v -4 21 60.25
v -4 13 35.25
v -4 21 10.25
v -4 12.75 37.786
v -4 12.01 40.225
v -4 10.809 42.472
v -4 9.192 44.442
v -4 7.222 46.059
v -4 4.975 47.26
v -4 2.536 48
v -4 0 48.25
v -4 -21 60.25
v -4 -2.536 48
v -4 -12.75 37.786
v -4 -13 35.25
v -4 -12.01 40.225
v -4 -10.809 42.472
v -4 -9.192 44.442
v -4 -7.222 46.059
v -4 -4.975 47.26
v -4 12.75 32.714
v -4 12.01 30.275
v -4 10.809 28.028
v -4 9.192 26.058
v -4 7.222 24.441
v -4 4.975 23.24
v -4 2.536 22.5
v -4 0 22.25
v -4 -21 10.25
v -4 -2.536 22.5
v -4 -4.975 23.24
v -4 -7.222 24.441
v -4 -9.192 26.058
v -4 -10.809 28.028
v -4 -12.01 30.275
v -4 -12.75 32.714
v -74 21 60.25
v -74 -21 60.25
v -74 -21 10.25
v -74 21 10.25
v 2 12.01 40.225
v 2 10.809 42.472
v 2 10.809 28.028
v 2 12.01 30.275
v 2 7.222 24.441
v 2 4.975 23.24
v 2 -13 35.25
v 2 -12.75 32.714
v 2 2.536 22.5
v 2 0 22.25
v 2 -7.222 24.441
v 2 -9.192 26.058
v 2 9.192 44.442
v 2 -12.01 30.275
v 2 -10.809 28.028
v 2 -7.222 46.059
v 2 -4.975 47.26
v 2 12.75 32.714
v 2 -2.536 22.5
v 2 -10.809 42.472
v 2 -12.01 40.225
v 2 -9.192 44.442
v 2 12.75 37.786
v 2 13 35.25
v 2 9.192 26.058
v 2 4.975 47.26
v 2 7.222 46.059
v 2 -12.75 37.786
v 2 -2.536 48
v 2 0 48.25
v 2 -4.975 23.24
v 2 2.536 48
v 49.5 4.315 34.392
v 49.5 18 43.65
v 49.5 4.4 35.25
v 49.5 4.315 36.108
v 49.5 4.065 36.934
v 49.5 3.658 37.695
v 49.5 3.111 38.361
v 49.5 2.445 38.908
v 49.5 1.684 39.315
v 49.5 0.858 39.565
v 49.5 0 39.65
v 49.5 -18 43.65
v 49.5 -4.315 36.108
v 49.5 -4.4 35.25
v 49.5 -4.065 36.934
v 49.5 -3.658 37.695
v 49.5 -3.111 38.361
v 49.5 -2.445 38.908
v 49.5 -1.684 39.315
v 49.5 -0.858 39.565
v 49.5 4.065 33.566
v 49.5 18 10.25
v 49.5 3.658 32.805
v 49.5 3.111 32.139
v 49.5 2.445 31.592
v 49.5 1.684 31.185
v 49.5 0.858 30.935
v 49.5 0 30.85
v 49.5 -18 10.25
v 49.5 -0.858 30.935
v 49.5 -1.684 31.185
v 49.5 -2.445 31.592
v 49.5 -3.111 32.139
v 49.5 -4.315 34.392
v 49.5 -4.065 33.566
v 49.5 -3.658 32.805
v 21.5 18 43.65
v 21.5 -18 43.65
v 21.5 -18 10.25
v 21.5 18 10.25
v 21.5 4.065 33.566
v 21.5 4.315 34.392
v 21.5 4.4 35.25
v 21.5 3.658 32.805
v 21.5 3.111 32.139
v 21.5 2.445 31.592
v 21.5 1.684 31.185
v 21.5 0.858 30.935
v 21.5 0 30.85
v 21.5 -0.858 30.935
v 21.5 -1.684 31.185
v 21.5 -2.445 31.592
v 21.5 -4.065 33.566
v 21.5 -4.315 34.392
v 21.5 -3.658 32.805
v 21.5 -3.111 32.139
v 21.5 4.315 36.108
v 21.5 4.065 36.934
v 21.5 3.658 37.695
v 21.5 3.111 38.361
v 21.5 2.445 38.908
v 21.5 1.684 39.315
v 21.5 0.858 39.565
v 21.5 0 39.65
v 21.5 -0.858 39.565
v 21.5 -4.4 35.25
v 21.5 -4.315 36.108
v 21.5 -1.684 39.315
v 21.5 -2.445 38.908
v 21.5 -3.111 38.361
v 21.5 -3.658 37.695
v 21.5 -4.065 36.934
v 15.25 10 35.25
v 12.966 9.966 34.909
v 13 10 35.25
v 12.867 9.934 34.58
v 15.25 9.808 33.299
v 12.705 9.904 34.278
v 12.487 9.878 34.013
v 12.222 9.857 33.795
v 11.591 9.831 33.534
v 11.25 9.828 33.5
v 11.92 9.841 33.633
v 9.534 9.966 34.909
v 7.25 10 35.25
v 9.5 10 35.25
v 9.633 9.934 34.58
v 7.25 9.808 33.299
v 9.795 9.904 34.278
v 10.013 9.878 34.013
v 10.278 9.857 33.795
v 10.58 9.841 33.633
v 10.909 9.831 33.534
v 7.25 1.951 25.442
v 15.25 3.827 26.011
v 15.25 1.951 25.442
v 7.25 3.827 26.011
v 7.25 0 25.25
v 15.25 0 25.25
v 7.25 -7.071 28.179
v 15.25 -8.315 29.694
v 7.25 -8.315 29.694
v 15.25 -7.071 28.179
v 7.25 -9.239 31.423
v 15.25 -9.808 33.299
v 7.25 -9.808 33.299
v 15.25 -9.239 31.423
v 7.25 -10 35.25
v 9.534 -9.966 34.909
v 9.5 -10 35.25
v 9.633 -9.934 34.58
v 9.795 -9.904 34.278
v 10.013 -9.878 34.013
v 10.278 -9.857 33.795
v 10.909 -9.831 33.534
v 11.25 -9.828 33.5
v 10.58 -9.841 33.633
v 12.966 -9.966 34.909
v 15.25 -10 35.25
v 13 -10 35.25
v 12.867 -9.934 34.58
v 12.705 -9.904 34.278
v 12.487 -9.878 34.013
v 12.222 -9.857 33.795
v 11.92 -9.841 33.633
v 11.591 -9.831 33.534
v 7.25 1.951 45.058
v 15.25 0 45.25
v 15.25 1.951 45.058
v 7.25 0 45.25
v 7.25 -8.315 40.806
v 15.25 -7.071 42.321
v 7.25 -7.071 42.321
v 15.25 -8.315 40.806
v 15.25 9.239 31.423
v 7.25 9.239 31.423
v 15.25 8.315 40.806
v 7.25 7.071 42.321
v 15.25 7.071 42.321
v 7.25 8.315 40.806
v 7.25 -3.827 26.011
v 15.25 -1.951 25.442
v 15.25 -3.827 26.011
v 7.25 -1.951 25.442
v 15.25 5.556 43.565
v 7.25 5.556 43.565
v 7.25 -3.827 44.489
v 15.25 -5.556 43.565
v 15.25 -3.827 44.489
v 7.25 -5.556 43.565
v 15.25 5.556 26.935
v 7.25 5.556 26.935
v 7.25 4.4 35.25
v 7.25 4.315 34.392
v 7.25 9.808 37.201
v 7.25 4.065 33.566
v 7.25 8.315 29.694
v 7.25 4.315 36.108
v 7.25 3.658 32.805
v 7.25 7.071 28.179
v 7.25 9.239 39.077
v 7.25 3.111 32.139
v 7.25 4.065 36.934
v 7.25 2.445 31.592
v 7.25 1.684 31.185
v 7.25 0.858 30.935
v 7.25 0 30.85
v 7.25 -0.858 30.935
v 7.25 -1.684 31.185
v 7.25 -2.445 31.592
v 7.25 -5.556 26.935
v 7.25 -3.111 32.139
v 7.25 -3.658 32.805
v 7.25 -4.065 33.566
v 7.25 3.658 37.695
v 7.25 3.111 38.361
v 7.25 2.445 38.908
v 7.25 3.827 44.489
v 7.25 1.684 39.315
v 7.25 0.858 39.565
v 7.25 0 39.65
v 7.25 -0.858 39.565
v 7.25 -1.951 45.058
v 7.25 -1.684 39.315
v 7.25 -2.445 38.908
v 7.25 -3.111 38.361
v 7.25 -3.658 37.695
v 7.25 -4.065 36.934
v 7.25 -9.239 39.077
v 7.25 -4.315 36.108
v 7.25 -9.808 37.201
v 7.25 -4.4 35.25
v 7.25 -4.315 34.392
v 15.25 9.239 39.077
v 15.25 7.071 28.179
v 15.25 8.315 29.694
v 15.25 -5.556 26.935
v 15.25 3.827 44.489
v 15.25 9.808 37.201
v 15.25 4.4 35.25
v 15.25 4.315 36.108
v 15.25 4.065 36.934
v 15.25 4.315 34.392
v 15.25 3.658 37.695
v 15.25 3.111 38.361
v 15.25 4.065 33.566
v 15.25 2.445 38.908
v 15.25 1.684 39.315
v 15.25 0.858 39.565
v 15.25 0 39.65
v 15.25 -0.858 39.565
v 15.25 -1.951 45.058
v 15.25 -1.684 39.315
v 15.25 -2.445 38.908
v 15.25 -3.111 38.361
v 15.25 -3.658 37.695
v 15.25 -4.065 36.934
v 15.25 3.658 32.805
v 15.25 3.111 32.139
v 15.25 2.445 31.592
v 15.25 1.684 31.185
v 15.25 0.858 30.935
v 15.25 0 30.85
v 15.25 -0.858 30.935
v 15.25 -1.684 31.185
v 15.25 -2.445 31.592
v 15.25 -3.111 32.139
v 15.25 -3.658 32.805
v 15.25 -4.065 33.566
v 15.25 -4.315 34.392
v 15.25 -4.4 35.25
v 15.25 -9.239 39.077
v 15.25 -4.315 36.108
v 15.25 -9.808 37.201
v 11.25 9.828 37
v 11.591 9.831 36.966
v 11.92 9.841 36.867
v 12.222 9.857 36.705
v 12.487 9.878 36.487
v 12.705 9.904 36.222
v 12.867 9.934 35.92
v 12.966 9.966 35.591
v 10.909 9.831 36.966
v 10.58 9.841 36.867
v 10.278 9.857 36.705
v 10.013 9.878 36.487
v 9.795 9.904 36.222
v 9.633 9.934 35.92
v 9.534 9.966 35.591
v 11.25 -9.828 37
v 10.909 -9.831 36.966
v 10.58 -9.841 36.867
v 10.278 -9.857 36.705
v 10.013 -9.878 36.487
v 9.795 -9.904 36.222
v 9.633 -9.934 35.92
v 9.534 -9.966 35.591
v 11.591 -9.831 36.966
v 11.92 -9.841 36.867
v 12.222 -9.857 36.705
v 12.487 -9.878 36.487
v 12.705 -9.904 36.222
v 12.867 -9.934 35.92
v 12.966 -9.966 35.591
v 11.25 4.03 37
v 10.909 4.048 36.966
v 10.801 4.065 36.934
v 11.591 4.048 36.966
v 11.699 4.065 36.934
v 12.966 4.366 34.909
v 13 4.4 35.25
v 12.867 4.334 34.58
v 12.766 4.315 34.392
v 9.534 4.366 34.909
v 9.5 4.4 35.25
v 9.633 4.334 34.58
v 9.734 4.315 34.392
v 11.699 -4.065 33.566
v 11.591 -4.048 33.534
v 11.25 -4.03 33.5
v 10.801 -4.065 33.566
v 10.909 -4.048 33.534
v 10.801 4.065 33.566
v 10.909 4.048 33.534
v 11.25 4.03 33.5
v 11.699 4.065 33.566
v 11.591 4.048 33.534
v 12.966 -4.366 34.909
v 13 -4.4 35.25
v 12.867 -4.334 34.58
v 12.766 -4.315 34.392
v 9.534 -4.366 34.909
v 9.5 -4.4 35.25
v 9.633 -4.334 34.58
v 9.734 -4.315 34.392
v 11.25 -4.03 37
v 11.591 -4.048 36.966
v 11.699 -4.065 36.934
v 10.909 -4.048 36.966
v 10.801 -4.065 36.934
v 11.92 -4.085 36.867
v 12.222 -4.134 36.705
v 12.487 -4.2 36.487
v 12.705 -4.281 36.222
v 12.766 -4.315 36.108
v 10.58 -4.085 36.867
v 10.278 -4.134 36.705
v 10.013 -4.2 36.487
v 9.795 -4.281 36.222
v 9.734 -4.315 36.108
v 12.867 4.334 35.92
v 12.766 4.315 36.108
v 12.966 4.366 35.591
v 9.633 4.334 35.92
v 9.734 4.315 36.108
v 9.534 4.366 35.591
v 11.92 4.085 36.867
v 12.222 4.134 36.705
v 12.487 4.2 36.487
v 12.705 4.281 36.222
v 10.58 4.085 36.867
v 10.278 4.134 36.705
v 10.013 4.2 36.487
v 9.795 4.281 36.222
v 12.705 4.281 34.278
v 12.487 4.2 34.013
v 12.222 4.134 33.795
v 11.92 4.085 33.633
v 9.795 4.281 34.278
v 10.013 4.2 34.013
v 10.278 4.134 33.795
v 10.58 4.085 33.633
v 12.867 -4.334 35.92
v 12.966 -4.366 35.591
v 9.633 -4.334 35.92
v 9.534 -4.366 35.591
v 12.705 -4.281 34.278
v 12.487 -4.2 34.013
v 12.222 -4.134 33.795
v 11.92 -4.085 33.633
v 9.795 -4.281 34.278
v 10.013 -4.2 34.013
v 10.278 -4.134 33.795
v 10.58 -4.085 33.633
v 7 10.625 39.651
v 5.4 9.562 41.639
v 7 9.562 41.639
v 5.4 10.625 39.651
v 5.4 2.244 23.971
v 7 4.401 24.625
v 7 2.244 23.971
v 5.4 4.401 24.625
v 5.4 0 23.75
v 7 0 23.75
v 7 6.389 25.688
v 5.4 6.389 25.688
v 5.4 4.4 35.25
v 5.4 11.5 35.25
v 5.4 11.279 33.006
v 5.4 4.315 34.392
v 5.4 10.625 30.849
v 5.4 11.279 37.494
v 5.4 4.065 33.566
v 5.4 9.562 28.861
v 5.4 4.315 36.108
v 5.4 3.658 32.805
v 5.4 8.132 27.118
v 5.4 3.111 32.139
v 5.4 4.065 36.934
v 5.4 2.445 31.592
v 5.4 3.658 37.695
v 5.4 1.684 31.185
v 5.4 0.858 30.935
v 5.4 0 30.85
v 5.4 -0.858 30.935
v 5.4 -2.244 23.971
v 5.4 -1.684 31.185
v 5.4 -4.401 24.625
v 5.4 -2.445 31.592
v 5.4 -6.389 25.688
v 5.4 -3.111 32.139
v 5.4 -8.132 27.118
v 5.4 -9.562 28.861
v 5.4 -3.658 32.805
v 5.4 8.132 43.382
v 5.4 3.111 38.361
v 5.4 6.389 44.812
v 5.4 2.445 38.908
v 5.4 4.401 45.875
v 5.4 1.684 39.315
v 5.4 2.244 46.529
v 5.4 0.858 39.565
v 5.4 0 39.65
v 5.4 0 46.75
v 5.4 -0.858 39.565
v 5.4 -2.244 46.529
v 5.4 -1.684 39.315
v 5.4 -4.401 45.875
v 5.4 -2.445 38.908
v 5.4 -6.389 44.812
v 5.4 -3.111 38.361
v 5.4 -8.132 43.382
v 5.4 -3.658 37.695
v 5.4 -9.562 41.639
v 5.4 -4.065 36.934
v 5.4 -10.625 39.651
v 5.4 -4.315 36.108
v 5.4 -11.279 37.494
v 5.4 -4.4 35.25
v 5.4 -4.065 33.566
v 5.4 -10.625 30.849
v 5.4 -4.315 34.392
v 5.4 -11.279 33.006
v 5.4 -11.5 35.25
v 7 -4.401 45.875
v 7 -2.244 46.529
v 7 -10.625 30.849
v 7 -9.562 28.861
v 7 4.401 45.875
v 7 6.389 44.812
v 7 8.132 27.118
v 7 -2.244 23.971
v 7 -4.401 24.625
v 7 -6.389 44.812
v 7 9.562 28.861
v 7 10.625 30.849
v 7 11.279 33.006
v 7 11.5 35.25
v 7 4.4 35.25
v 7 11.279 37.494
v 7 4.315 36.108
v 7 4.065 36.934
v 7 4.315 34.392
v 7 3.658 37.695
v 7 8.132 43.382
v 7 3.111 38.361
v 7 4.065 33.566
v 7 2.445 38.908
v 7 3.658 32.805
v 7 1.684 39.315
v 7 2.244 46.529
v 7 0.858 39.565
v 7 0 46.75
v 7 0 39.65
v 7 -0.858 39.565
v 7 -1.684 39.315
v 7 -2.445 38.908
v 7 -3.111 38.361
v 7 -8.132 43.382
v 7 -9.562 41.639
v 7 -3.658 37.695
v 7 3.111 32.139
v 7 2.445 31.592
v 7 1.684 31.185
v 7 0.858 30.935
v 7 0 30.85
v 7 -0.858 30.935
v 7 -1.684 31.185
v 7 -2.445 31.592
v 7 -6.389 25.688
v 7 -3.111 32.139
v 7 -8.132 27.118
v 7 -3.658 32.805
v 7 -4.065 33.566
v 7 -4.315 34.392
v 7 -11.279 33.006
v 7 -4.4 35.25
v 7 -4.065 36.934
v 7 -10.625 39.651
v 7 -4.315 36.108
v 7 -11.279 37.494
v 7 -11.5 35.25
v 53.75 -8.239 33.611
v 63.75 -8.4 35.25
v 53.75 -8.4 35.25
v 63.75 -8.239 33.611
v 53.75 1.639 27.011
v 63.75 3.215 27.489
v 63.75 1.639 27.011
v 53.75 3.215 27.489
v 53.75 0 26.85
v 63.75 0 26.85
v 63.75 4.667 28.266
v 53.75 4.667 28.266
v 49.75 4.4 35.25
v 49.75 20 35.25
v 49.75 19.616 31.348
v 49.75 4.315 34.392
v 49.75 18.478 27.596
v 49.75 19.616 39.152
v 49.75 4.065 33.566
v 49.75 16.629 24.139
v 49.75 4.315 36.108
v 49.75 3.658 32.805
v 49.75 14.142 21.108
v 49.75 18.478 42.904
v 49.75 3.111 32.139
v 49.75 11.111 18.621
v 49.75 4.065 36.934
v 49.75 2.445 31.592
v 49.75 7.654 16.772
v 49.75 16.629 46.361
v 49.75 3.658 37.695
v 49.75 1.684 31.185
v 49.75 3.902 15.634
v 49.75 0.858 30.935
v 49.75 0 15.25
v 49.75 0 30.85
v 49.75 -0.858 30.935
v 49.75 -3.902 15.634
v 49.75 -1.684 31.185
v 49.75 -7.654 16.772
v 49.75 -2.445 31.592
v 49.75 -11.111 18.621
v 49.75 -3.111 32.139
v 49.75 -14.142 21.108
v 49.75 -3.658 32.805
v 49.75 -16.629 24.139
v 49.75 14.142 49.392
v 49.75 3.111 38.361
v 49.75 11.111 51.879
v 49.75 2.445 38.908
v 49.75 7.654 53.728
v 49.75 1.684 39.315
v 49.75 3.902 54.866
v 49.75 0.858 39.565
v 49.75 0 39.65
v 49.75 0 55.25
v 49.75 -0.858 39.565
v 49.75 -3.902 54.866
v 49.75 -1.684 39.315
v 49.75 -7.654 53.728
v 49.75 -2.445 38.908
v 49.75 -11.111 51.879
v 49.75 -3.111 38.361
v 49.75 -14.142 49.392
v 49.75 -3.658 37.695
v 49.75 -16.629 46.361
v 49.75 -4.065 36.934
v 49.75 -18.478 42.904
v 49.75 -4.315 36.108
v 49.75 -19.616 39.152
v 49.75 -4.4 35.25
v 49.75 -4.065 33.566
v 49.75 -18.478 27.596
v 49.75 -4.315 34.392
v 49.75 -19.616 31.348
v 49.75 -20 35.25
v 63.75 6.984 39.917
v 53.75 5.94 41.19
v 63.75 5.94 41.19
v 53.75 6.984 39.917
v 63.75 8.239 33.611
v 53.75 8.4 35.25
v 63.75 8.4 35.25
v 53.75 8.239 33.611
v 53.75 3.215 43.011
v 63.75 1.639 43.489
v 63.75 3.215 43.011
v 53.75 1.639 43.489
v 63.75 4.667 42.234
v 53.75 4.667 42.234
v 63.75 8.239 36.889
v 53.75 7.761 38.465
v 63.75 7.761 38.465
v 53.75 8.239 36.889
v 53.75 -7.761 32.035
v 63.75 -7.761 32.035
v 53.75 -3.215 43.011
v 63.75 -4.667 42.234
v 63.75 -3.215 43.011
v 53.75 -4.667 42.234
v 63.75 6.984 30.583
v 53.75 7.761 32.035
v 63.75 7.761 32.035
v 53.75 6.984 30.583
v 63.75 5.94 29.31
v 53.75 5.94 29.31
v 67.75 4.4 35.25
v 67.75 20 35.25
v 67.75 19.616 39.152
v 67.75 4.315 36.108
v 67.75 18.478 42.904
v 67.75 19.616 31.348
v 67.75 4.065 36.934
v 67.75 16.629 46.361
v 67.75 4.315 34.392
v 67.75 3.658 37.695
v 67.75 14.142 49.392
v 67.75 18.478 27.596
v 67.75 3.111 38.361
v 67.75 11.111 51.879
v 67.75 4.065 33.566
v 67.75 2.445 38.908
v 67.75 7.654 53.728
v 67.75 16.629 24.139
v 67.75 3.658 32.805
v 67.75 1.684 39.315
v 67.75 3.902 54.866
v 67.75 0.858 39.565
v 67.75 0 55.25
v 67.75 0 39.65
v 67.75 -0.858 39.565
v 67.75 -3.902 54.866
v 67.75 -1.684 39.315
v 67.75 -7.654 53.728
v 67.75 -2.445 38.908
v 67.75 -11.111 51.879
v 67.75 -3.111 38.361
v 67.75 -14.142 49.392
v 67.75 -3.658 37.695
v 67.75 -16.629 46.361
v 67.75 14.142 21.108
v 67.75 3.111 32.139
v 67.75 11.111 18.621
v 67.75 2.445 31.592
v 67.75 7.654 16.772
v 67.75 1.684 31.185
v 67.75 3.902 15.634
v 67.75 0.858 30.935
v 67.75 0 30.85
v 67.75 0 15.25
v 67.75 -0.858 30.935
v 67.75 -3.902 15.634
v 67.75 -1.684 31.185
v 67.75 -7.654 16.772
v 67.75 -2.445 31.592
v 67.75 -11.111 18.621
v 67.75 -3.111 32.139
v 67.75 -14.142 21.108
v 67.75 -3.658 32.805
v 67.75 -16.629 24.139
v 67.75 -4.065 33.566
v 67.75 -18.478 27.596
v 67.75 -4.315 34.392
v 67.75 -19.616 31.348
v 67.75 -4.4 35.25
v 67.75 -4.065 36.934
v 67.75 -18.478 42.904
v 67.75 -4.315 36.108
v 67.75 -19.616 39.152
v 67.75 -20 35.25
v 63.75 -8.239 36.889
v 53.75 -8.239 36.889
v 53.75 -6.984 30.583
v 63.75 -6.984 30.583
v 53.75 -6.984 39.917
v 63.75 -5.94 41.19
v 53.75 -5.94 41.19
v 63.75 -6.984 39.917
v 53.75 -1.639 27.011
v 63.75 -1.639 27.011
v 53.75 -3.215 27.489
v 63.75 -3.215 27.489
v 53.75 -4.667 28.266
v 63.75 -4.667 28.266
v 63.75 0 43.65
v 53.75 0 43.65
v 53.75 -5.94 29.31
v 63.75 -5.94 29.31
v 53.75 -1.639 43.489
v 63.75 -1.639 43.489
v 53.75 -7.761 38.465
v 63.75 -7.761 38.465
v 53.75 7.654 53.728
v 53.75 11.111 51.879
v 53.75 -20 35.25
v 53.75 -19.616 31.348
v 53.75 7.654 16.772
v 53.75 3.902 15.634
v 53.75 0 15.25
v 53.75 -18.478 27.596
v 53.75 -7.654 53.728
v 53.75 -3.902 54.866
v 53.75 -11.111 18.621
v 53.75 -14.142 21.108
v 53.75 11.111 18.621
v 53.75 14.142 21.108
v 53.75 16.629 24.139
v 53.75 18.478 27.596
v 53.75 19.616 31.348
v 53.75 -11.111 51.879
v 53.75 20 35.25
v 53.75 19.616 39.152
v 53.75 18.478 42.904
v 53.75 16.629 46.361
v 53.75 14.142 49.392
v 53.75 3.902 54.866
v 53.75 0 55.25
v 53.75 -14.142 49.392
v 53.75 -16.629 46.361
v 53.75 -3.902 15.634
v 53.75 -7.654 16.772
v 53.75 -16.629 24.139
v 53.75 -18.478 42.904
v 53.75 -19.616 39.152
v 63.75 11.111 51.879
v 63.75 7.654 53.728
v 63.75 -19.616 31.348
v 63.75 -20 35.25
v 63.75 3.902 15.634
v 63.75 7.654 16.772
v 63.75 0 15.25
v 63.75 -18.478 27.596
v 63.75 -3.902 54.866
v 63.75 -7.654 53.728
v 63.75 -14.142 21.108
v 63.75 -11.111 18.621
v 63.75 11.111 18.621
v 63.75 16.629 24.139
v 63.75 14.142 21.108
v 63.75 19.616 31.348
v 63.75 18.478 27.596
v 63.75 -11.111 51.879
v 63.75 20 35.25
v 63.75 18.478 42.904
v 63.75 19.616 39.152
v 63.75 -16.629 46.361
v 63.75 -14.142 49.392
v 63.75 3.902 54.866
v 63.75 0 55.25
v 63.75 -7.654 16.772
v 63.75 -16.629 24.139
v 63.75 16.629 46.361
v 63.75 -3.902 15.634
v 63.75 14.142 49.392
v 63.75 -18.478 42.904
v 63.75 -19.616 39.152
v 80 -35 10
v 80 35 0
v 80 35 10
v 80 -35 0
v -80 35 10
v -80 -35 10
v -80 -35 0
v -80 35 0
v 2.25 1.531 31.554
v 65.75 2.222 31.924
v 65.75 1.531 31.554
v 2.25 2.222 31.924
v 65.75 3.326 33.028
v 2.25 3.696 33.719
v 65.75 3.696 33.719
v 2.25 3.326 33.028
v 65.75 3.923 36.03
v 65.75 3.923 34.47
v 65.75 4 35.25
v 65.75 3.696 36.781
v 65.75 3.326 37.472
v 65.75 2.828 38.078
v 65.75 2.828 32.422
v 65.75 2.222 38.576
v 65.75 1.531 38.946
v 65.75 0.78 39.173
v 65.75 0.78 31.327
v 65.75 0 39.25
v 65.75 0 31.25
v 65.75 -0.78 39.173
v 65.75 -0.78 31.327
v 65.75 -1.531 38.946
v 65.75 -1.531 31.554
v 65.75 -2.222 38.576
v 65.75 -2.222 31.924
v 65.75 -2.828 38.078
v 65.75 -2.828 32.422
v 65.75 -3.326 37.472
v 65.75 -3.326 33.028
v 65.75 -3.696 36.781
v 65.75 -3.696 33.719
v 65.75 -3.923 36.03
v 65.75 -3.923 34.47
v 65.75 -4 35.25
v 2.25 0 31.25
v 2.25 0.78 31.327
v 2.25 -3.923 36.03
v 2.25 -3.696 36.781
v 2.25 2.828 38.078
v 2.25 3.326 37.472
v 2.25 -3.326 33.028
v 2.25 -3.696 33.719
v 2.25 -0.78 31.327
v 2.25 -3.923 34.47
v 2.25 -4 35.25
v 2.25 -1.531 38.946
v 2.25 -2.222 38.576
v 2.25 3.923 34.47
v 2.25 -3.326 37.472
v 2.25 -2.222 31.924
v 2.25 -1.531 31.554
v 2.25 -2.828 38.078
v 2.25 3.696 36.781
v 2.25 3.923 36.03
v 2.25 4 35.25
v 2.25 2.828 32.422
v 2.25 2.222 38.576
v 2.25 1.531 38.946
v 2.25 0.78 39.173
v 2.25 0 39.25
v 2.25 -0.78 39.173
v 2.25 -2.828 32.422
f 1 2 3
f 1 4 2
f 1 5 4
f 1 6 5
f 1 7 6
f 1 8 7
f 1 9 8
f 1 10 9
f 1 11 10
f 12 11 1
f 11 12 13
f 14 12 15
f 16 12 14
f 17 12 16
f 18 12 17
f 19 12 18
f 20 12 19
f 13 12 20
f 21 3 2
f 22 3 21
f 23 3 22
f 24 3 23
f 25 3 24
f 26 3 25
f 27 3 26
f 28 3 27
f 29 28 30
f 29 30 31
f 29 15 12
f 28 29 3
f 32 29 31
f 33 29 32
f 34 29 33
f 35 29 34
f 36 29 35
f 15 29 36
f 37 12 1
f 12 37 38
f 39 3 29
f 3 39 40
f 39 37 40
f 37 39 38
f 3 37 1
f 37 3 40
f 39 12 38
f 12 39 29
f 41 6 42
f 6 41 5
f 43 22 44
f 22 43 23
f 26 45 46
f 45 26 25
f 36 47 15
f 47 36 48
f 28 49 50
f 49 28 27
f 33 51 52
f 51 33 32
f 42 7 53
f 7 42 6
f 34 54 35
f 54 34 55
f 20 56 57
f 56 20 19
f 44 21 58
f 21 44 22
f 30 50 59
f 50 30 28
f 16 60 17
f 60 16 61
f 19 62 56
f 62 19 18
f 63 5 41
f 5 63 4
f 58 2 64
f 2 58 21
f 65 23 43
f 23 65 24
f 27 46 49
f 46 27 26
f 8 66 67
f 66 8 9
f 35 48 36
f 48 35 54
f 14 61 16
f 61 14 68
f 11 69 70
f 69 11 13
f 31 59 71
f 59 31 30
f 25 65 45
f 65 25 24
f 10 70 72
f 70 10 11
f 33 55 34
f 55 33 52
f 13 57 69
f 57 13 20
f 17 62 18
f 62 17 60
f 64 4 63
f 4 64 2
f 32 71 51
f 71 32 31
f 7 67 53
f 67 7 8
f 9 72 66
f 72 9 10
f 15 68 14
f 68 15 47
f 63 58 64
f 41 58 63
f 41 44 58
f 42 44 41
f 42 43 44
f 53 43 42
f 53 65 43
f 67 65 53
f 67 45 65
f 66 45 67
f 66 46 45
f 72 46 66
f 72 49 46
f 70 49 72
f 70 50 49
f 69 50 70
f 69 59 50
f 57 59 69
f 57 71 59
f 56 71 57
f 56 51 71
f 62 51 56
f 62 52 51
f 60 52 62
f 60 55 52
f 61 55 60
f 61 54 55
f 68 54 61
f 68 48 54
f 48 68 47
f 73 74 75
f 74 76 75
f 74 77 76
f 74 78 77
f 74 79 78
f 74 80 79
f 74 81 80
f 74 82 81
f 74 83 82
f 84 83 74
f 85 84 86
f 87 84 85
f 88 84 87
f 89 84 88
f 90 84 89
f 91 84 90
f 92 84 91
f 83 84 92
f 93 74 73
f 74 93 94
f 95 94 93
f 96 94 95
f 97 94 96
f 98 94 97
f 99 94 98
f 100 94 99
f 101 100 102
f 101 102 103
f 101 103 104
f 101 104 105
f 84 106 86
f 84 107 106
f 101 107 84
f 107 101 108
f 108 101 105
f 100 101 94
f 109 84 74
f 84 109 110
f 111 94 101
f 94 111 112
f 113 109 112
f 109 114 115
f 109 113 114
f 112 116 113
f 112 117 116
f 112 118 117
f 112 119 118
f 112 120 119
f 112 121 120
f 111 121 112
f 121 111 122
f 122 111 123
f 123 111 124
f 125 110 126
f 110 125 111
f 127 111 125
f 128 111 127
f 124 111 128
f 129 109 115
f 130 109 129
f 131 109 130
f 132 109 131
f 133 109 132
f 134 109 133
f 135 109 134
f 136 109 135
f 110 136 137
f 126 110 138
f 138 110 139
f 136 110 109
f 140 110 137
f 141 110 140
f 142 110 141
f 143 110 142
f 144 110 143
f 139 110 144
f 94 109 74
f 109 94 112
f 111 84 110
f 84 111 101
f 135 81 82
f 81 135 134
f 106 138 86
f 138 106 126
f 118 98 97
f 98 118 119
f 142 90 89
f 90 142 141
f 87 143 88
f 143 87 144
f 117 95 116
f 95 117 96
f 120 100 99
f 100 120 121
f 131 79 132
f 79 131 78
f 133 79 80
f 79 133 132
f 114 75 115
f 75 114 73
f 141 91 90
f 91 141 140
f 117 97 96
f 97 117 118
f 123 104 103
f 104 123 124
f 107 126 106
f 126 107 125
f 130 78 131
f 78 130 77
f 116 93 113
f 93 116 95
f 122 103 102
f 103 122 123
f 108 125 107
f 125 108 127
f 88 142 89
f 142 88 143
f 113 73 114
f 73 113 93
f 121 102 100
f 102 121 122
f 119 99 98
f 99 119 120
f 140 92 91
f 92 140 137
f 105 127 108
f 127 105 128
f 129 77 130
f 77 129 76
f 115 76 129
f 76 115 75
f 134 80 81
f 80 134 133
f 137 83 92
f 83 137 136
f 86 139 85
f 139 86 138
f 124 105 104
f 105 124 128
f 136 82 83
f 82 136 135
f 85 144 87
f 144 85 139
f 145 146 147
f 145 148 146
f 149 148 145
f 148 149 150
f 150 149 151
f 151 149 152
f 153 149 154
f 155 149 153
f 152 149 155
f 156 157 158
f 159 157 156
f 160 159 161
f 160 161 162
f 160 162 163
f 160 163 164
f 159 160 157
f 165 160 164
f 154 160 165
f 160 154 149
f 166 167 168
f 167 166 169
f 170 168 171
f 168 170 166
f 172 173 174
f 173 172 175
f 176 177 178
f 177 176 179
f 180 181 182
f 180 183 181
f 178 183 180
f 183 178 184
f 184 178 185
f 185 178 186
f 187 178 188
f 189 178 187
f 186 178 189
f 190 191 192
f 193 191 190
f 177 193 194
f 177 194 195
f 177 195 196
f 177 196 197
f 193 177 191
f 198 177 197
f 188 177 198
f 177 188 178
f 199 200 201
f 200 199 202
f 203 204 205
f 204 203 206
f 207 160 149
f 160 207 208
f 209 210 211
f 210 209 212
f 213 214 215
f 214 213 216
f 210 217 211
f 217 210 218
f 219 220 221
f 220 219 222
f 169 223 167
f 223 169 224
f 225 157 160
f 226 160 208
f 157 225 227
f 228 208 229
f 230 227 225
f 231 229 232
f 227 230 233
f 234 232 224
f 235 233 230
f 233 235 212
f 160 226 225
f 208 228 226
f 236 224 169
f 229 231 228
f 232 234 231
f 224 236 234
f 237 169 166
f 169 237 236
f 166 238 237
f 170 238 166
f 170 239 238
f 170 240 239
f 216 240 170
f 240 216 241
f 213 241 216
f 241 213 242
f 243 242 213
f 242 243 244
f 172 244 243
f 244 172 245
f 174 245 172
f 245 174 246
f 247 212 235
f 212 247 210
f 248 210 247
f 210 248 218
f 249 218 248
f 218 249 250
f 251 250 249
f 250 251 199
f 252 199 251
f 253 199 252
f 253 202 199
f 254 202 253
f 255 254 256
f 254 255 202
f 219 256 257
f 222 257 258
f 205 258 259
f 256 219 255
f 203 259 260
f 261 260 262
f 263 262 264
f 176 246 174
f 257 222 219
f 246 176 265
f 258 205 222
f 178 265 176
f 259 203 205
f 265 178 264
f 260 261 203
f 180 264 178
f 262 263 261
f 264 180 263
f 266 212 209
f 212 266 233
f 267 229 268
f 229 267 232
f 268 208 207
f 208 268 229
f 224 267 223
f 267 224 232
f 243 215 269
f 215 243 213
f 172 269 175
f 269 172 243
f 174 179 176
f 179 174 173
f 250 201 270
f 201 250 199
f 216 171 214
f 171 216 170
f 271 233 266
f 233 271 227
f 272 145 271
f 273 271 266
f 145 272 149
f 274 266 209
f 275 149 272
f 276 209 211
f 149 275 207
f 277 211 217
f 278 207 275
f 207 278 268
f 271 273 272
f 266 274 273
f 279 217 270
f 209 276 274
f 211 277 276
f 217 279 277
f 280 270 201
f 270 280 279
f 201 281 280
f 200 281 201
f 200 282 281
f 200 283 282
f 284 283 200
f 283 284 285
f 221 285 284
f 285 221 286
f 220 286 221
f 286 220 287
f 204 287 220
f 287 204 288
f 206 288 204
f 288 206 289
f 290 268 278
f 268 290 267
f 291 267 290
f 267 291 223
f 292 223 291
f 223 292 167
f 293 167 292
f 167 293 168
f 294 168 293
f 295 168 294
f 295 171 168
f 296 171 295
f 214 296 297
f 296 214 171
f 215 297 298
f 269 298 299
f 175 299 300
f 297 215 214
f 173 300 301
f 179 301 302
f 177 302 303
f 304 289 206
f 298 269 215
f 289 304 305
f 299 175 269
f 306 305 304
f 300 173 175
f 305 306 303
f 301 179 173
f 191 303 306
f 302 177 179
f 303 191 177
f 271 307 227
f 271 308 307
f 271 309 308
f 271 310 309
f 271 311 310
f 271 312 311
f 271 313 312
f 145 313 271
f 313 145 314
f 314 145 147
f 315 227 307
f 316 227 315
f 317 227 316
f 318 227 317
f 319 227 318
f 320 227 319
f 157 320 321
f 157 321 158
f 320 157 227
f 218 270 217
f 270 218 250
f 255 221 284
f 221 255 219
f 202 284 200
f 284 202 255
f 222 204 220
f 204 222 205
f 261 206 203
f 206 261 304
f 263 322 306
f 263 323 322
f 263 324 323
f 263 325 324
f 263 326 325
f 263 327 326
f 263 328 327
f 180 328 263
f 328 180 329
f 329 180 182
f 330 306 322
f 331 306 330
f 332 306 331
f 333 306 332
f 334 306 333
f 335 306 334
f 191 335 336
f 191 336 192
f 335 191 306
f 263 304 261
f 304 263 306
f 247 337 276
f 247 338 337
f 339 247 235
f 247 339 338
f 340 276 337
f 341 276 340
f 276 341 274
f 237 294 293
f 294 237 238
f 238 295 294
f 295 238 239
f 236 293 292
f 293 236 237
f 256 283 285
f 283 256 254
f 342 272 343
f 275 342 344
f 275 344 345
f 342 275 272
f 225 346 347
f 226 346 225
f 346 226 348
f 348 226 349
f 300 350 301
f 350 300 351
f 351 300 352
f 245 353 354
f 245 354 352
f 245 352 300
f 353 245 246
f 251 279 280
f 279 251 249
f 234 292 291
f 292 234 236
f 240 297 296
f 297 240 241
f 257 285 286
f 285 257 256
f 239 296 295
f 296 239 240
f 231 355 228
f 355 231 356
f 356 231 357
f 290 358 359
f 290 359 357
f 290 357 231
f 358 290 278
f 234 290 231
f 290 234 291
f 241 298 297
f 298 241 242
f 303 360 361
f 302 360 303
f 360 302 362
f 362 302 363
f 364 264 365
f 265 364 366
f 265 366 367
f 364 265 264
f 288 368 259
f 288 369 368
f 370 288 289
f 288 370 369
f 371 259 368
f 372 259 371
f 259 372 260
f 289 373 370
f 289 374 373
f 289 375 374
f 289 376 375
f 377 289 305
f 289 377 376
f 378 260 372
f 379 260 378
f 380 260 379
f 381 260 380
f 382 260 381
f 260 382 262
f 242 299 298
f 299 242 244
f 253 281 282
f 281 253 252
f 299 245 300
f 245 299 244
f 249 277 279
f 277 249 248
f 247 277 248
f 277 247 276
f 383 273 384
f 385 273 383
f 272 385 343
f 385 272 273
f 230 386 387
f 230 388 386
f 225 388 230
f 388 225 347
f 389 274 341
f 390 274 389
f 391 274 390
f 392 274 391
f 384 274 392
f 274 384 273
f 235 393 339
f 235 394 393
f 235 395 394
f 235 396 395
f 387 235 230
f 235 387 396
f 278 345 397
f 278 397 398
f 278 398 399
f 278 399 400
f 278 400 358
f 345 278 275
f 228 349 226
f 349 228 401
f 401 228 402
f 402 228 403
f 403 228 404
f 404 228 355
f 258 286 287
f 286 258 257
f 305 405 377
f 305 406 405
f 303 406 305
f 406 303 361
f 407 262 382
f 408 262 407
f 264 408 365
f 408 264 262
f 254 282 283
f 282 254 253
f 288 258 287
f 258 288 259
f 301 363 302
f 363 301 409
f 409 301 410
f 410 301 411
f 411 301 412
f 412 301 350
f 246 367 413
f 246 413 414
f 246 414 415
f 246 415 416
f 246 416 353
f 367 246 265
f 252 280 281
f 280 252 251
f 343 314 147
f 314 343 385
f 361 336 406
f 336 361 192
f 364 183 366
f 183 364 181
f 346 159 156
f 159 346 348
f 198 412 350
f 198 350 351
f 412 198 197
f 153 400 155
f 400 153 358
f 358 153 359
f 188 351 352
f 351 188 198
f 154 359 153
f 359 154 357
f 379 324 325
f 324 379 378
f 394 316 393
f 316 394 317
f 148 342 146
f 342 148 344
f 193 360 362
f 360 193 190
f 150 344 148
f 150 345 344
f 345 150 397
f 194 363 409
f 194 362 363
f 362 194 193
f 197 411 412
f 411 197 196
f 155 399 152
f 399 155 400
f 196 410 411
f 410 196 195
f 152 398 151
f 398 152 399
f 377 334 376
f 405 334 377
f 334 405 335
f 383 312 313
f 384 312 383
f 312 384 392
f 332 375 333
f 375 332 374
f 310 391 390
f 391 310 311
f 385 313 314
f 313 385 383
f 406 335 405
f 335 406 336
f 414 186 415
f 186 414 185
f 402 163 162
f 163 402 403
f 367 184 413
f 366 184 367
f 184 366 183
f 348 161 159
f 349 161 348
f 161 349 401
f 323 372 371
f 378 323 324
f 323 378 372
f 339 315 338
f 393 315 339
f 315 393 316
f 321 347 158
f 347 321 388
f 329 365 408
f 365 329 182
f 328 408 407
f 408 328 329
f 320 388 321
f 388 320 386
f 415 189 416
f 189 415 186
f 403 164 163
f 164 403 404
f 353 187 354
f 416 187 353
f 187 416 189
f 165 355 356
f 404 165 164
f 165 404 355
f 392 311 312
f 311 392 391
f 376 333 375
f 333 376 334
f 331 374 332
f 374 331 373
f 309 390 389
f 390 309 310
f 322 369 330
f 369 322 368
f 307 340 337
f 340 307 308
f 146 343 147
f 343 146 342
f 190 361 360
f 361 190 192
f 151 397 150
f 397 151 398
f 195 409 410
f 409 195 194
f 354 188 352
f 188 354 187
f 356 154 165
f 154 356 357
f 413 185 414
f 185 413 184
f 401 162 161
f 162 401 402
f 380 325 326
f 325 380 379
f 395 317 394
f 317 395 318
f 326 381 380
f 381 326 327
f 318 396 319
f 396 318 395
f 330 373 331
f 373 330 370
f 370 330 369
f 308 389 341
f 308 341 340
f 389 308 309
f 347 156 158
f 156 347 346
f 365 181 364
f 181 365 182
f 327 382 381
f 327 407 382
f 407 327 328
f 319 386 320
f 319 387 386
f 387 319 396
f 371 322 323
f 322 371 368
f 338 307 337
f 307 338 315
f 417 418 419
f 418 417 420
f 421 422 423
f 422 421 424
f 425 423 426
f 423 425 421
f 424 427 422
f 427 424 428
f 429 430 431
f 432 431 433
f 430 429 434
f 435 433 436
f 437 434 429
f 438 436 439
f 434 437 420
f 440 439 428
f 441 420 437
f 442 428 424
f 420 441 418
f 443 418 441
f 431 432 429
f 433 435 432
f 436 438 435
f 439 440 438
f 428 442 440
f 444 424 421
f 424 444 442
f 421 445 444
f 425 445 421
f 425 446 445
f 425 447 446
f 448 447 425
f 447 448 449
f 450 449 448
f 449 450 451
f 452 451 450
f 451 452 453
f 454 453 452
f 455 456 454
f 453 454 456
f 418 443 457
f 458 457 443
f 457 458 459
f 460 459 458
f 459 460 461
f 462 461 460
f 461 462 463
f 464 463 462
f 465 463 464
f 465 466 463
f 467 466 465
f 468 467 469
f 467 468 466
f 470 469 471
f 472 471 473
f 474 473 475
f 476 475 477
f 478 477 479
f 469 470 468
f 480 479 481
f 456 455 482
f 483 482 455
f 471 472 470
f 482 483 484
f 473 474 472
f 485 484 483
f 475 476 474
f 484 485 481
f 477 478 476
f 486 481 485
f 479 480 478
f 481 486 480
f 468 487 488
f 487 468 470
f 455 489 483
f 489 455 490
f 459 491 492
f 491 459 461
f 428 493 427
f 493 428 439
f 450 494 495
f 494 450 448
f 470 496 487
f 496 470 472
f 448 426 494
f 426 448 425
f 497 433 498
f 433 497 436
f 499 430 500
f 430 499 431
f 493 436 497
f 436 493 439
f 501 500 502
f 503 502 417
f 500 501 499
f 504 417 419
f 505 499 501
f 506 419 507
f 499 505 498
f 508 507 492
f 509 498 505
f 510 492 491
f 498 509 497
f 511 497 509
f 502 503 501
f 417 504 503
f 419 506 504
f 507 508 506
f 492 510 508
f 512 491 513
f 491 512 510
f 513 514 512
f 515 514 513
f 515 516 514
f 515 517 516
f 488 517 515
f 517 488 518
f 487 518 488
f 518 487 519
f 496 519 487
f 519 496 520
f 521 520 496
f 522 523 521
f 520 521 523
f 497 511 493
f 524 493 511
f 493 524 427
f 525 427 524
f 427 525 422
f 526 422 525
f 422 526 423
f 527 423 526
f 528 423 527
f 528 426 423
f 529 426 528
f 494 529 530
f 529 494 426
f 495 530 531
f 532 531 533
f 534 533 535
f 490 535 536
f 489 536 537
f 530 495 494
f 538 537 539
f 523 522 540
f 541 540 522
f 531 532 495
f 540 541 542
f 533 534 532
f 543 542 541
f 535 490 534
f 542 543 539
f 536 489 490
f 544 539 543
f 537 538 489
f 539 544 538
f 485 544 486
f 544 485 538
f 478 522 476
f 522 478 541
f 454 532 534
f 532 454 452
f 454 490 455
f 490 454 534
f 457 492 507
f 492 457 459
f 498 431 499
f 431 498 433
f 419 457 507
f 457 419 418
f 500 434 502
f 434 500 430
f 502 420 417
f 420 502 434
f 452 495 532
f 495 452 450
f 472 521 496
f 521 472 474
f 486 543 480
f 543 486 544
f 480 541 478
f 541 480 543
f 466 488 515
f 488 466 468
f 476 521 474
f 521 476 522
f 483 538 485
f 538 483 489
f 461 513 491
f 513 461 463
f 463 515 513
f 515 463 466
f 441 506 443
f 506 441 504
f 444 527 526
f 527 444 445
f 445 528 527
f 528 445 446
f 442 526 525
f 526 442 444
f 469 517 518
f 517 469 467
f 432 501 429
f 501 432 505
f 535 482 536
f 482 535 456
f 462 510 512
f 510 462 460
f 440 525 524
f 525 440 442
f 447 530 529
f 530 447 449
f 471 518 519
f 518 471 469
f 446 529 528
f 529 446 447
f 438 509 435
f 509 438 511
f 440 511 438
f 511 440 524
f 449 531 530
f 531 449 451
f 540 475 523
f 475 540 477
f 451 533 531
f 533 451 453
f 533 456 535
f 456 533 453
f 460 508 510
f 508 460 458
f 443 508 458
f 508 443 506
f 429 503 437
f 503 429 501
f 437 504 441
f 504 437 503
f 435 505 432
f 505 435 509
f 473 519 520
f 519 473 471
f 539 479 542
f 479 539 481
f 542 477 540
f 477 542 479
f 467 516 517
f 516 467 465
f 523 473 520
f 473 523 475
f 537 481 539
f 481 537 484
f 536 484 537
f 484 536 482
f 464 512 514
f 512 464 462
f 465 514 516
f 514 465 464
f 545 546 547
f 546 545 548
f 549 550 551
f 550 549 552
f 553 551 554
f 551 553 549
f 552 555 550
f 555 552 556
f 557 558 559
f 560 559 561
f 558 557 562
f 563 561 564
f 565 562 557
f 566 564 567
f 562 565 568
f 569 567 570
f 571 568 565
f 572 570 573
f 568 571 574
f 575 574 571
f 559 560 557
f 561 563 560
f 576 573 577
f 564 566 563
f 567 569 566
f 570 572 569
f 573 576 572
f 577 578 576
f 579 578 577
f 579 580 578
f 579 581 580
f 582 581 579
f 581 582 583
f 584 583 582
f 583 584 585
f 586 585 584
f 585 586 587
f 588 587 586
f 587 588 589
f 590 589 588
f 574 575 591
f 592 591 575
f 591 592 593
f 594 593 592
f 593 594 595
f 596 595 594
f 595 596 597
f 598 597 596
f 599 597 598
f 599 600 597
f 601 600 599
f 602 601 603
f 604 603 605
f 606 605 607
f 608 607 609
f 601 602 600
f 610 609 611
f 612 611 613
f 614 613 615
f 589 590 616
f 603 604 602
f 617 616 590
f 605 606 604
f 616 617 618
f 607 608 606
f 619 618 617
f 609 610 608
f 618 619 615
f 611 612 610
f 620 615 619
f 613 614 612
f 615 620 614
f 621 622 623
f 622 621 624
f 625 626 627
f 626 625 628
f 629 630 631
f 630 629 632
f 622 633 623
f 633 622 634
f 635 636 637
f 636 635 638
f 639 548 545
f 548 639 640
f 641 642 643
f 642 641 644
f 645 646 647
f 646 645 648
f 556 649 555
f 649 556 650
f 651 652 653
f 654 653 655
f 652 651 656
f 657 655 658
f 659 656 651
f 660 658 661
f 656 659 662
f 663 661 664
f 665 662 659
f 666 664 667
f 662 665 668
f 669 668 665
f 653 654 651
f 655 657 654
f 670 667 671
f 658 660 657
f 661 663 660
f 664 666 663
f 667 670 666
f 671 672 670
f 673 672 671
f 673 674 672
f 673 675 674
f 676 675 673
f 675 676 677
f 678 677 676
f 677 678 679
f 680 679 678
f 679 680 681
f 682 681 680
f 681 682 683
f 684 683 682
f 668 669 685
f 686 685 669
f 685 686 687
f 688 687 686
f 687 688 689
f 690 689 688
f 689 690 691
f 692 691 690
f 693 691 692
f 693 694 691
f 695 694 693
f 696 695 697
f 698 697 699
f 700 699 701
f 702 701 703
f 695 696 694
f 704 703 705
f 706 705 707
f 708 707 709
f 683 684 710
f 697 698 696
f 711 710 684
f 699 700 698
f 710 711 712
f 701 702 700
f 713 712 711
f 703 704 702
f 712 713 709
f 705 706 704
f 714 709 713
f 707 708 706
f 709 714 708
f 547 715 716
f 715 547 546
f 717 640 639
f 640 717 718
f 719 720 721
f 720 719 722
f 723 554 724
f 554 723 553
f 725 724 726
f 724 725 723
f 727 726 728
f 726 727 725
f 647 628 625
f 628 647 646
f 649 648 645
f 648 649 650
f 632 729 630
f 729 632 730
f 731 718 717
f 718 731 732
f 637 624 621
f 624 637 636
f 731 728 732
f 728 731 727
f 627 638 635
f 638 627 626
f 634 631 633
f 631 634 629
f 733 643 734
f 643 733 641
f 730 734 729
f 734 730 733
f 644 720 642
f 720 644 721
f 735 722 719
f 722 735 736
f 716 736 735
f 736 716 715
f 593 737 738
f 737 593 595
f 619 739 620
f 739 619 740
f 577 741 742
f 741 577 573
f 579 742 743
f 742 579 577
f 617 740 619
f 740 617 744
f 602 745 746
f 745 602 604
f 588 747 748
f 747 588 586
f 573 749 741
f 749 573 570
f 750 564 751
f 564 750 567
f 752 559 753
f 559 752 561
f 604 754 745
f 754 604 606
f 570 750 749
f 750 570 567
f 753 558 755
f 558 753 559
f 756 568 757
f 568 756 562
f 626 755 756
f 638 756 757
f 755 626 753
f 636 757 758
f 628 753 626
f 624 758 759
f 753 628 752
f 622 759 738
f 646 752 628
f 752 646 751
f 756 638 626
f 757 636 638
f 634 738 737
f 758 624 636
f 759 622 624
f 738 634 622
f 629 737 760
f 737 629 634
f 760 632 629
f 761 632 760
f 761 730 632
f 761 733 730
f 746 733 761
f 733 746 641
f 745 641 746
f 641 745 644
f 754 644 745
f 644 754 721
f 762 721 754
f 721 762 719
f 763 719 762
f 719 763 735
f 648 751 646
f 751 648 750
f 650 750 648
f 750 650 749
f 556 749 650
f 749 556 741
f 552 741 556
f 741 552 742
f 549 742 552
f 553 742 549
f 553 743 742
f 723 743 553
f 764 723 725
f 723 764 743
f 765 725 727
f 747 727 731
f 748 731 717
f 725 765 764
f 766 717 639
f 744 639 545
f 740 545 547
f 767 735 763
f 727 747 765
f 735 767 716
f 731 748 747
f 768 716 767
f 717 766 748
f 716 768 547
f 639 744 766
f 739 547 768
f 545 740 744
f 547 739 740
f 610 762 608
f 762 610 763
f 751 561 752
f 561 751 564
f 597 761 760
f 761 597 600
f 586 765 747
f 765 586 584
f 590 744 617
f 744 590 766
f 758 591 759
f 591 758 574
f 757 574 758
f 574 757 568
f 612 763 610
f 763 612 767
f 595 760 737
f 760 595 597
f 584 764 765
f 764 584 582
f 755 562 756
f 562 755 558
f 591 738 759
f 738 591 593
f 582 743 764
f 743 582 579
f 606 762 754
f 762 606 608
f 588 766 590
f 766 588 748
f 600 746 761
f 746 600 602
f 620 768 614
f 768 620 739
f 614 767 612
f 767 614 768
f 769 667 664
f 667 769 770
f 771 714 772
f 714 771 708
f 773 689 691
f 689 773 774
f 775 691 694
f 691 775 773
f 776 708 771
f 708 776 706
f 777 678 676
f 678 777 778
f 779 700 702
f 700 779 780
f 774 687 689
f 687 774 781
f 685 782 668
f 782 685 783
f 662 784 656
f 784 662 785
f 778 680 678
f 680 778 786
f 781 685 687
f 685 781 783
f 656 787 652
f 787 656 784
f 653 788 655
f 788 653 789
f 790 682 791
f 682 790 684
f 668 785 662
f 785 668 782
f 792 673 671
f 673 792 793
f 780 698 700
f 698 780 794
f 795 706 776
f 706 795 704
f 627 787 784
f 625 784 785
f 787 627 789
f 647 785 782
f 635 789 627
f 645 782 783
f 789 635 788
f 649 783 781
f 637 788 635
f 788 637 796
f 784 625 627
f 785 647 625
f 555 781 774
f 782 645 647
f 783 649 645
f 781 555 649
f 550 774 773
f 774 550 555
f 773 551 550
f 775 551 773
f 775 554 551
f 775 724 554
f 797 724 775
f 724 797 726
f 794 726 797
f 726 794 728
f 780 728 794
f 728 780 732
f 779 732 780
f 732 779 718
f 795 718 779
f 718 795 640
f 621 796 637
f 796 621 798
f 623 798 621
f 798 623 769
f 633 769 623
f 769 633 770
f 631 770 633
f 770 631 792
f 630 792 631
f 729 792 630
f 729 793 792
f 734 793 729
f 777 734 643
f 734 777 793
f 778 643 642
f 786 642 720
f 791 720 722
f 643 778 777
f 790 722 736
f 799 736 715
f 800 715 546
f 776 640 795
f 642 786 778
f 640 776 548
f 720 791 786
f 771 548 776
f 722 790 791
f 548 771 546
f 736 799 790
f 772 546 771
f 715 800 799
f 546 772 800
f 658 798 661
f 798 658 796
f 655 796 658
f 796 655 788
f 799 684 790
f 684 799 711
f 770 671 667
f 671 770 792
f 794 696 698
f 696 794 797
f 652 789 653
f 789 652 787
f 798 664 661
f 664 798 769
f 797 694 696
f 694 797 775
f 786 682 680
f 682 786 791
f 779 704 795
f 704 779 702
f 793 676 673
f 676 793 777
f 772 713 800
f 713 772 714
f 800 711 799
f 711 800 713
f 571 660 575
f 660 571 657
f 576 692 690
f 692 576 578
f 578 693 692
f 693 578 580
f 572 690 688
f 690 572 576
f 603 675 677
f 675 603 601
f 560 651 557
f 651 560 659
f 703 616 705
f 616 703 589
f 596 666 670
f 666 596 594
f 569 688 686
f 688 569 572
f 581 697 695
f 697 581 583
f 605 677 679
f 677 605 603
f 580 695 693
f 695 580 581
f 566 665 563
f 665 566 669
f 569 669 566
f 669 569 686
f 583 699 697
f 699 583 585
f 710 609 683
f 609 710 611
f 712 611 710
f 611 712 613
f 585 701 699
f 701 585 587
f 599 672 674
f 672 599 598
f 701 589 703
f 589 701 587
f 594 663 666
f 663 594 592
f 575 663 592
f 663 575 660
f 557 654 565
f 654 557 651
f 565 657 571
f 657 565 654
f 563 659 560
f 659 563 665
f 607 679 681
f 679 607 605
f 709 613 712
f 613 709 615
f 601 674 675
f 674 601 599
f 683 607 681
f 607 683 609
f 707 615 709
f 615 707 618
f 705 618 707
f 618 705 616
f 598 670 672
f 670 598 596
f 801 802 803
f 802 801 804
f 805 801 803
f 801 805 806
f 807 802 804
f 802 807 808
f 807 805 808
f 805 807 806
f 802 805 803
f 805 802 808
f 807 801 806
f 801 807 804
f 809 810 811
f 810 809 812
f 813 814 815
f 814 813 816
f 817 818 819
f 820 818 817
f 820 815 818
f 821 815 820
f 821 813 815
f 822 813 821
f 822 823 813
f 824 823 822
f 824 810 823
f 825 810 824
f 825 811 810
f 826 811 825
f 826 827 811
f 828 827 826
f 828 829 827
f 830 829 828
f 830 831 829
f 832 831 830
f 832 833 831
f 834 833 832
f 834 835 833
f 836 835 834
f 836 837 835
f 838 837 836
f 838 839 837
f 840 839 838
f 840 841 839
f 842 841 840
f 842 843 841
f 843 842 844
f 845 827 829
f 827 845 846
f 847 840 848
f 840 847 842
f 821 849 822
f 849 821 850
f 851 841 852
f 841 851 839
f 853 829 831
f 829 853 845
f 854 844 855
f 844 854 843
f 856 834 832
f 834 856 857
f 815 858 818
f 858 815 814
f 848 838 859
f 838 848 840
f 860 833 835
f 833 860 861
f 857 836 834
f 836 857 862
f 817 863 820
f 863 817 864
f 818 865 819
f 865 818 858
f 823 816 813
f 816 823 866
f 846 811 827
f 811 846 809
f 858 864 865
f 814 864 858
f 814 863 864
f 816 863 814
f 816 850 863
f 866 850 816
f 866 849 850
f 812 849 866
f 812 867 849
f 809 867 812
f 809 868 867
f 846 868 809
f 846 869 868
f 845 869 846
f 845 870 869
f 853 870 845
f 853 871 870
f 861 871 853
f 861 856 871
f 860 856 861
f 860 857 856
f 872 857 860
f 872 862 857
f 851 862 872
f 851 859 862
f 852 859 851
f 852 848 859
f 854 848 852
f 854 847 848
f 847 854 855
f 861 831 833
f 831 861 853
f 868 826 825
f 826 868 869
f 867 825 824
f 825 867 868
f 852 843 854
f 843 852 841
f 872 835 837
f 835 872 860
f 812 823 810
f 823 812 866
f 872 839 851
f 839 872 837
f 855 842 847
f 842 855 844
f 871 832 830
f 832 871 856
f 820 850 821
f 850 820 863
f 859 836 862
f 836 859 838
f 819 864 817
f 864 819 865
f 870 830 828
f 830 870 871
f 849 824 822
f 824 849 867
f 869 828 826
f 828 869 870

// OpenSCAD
$fn = 32;

// ------------------------------------------------------------------------
// Motor drive station: motor 70 x 50 mm, shaft d8, pulley d40
// Every part is its own module, assembly() places every instance.
// ------------------------------------------------------------------------

// --- part 1 ---
module station_bed() {
  difference() {
    translate([-80, -35, 0]) cube([160, 70, 10]);
  }
}

// --- part 2 ---
module drive_motor() {
  union() {
    translate([-35, -21, 0]) cube([70, 42, 50]);
    translate([38, 0, 25]) rotate([0, 90, 0]) cylinder(h = 6, d = 26, center = true);
  }
}

// --- part 3 ---
module pillow_block() {
  difference() {
    translate([-14, -18, 0]) cube([28, 36, 33.4]);
    translate([0, 0, 25]) rotate([0, 90, 0]) cylinder(h = 30, d = 8.8, center = true);
  }
}

// --- part 4 ---
module drive_shaft() {
  translate([0, 0, -31.75]) cylinder(h = 63.5, d = 8);
}

// --- part 5 ---
module shaft_collar() {
  difference() {
    cylinder(h = 8, d = 20);
    translate([0, 0, -1]) cylinder(h = 10, d = 8.8);
    translate([0, 0, 4]) rotate([90, 0, 0]) cylinder(h = 22, d = 3.5, center = true);
  }
}

// --- part 6 ---
module collar_washer() {
  difference() {
      translate([0, 0, 0]) cylinder(h = 1.6, d = 23);
      translate([0, 0, -1]) cylinder(h = 3.6, d = 8.8);
    }
}

// --- part 7 ---
module drive_pulley() {
  difference() {
    union() {
      cylinder(h = 18, d = 16.8);
      cylinder(h = 4, d = 40);
      translate([0, 0, 14]) cylinder(h = 4, d = 40);
    }
    translate([0, 0, -1]) cylinder(h = 20, d = 8.8);
  }
}

// --- assembly ---
module assembly() {
  color([0.80, 0.24, 0.20]) translate([0, 0, 0]) rotate([0, 0, 0]) station_bed();
  color([0.20, 0.45, 0.75]) translate([-39, 0, 10.25]) rotate([0, 0, 0]) drive_motor();
  color([0.25, 0.62, 0.32]) translate([35.5, 0, 10.25]) rotate([0, 0, 0]) pillow_block();
  color([0.92, 0.70, 0.18]) translate([34, 0, 35.25]) rotate([0, 90, 0]) drive_shaft();
  color([0.58, 0.35, 0.70]) translate([7.25, 0, 35.25]) rotate([0, 90, 0]) shaft_collar();
  color([0.16, 0.66, 0.66]) translate([5.4, 0, 35.25]) rotate([0, 90, 0]) collar_washer();
  color([0.85, 0.48, 0.18]) translate([49.75, 0, 35.25]) rotate([0, 90, 0]) drive_pulley();
}

assembly();
